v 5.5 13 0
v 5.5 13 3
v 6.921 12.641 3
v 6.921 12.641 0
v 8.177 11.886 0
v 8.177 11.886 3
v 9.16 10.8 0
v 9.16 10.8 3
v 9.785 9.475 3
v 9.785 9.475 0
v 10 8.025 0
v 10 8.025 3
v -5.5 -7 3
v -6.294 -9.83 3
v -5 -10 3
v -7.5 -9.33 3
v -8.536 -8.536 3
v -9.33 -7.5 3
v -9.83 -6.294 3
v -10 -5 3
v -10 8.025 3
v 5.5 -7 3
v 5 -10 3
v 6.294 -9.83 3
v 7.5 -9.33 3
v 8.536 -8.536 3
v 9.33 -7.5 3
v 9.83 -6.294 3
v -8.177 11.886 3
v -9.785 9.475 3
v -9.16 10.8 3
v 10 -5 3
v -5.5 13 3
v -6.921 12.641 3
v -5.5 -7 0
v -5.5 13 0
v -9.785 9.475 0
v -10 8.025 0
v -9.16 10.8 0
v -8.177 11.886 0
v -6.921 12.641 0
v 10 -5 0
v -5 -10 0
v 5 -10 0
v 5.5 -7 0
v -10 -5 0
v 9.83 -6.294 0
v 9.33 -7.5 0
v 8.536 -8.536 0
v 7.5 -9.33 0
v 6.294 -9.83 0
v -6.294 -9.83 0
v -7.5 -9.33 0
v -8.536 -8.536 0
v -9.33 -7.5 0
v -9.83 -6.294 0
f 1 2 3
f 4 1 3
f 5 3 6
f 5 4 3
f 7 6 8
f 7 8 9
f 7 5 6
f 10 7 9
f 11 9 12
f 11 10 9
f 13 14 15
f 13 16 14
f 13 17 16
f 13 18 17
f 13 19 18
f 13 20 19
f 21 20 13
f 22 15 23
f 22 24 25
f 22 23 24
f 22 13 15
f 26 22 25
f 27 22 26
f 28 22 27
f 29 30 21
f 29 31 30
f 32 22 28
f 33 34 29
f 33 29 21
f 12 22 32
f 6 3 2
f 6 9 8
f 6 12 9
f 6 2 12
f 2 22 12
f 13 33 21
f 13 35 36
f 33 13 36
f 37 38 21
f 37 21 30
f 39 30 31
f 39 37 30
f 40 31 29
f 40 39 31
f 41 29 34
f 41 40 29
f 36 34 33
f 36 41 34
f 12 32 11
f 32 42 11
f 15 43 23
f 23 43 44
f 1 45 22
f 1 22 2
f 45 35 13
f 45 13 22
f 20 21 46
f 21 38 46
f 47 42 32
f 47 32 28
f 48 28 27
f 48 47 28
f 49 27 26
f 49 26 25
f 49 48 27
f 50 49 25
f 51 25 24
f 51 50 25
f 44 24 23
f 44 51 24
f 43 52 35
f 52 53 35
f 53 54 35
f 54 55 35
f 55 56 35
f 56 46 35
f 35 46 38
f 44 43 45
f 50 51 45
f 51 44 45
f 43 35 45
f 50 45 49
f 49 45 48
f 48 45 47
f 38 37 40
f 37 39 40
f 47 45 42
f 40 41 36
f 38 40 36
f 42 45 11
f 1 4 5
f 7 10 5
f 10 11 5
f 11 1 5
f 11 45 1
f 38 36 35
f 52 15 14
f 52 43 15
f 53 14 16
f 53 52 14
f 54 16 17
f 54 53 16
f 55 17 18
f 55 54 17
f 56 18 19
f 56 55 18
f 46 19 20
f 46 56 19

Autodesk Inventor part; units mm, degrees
ref_plane "YZ Plane" through (0, 0, 0) normal (1, 0, 0) x (0, 1, 0)
ref_plane "XZ Plane" through (0, 0, 0) normal (0, 1, 0) x (-1, 0, 0)
ref_plane "XY Plane" through (0, 0, 0) normal (0, 0, 1) x (1, 0, 0)
sketch "Boceto1" plane through (0, 0, 0) normal (0, 0, 1) x (1, 0, 0)
  line L0 (-10, -10) -> (10, -10)
  line L1 (10, -10) -> (10, 10)
  line L2 (-10, 10) -> (-10, -10)
  line L3 (-10, -10) -> (10, 10) construction
  line L4 (10, -10) -> (-10, 10) construction
  circle A0 centre (0, 0) radius 5.5
  line L5 (-5.5, 0) -> (-5.5, 11.2745)
  line L6 (-5.5, 11.2745) -> (-5.5, 10)
  line L7 (5.5, 0) -> (5.5, 6.4261)
  line L8 (5.5, 6.4261) -> (5.5, 10.6373)
  line L9 (-5.5, 0) -> (-5.5, -7)
  line L10 (-5.5, -7) -> (5.5, -7)
  line L11 (5.5, -7) -> (5.5, 0)
  line L12 (-5.5, 10) -> (-5.5, 13)
  line L13 (-5.5, 13) -> (-10, 13)
  line L14 (-10, 13) -> (-10, 10)
  line L15 (5.5, 10) -> (5.5, 13)
  line L16 (10, 13) -> (10, 10)
  line L17 (5.5, 13) -> (10, 13)
  dimension "d0" = 20
  dimension "d1" = 20
  dimension "d2" = 11
  dimension "d4" = 7
  dimension "d5" = 3
  dimension "d6" = 23
extrude "Extrusión1" add sketch "Boceto1" along normal blind 3 contours L2 L14 L13 L12 L5 L9 L10 L11 L7 L8 L15 L17 L16 L1 L0
fillet "Empalme1" radius 5 4 edges at (10, -10, 1.5) (-10, -10, 1.5) (-10, 13, 1.5) (10, 13, 1.5)
properties part number "seguro2"
